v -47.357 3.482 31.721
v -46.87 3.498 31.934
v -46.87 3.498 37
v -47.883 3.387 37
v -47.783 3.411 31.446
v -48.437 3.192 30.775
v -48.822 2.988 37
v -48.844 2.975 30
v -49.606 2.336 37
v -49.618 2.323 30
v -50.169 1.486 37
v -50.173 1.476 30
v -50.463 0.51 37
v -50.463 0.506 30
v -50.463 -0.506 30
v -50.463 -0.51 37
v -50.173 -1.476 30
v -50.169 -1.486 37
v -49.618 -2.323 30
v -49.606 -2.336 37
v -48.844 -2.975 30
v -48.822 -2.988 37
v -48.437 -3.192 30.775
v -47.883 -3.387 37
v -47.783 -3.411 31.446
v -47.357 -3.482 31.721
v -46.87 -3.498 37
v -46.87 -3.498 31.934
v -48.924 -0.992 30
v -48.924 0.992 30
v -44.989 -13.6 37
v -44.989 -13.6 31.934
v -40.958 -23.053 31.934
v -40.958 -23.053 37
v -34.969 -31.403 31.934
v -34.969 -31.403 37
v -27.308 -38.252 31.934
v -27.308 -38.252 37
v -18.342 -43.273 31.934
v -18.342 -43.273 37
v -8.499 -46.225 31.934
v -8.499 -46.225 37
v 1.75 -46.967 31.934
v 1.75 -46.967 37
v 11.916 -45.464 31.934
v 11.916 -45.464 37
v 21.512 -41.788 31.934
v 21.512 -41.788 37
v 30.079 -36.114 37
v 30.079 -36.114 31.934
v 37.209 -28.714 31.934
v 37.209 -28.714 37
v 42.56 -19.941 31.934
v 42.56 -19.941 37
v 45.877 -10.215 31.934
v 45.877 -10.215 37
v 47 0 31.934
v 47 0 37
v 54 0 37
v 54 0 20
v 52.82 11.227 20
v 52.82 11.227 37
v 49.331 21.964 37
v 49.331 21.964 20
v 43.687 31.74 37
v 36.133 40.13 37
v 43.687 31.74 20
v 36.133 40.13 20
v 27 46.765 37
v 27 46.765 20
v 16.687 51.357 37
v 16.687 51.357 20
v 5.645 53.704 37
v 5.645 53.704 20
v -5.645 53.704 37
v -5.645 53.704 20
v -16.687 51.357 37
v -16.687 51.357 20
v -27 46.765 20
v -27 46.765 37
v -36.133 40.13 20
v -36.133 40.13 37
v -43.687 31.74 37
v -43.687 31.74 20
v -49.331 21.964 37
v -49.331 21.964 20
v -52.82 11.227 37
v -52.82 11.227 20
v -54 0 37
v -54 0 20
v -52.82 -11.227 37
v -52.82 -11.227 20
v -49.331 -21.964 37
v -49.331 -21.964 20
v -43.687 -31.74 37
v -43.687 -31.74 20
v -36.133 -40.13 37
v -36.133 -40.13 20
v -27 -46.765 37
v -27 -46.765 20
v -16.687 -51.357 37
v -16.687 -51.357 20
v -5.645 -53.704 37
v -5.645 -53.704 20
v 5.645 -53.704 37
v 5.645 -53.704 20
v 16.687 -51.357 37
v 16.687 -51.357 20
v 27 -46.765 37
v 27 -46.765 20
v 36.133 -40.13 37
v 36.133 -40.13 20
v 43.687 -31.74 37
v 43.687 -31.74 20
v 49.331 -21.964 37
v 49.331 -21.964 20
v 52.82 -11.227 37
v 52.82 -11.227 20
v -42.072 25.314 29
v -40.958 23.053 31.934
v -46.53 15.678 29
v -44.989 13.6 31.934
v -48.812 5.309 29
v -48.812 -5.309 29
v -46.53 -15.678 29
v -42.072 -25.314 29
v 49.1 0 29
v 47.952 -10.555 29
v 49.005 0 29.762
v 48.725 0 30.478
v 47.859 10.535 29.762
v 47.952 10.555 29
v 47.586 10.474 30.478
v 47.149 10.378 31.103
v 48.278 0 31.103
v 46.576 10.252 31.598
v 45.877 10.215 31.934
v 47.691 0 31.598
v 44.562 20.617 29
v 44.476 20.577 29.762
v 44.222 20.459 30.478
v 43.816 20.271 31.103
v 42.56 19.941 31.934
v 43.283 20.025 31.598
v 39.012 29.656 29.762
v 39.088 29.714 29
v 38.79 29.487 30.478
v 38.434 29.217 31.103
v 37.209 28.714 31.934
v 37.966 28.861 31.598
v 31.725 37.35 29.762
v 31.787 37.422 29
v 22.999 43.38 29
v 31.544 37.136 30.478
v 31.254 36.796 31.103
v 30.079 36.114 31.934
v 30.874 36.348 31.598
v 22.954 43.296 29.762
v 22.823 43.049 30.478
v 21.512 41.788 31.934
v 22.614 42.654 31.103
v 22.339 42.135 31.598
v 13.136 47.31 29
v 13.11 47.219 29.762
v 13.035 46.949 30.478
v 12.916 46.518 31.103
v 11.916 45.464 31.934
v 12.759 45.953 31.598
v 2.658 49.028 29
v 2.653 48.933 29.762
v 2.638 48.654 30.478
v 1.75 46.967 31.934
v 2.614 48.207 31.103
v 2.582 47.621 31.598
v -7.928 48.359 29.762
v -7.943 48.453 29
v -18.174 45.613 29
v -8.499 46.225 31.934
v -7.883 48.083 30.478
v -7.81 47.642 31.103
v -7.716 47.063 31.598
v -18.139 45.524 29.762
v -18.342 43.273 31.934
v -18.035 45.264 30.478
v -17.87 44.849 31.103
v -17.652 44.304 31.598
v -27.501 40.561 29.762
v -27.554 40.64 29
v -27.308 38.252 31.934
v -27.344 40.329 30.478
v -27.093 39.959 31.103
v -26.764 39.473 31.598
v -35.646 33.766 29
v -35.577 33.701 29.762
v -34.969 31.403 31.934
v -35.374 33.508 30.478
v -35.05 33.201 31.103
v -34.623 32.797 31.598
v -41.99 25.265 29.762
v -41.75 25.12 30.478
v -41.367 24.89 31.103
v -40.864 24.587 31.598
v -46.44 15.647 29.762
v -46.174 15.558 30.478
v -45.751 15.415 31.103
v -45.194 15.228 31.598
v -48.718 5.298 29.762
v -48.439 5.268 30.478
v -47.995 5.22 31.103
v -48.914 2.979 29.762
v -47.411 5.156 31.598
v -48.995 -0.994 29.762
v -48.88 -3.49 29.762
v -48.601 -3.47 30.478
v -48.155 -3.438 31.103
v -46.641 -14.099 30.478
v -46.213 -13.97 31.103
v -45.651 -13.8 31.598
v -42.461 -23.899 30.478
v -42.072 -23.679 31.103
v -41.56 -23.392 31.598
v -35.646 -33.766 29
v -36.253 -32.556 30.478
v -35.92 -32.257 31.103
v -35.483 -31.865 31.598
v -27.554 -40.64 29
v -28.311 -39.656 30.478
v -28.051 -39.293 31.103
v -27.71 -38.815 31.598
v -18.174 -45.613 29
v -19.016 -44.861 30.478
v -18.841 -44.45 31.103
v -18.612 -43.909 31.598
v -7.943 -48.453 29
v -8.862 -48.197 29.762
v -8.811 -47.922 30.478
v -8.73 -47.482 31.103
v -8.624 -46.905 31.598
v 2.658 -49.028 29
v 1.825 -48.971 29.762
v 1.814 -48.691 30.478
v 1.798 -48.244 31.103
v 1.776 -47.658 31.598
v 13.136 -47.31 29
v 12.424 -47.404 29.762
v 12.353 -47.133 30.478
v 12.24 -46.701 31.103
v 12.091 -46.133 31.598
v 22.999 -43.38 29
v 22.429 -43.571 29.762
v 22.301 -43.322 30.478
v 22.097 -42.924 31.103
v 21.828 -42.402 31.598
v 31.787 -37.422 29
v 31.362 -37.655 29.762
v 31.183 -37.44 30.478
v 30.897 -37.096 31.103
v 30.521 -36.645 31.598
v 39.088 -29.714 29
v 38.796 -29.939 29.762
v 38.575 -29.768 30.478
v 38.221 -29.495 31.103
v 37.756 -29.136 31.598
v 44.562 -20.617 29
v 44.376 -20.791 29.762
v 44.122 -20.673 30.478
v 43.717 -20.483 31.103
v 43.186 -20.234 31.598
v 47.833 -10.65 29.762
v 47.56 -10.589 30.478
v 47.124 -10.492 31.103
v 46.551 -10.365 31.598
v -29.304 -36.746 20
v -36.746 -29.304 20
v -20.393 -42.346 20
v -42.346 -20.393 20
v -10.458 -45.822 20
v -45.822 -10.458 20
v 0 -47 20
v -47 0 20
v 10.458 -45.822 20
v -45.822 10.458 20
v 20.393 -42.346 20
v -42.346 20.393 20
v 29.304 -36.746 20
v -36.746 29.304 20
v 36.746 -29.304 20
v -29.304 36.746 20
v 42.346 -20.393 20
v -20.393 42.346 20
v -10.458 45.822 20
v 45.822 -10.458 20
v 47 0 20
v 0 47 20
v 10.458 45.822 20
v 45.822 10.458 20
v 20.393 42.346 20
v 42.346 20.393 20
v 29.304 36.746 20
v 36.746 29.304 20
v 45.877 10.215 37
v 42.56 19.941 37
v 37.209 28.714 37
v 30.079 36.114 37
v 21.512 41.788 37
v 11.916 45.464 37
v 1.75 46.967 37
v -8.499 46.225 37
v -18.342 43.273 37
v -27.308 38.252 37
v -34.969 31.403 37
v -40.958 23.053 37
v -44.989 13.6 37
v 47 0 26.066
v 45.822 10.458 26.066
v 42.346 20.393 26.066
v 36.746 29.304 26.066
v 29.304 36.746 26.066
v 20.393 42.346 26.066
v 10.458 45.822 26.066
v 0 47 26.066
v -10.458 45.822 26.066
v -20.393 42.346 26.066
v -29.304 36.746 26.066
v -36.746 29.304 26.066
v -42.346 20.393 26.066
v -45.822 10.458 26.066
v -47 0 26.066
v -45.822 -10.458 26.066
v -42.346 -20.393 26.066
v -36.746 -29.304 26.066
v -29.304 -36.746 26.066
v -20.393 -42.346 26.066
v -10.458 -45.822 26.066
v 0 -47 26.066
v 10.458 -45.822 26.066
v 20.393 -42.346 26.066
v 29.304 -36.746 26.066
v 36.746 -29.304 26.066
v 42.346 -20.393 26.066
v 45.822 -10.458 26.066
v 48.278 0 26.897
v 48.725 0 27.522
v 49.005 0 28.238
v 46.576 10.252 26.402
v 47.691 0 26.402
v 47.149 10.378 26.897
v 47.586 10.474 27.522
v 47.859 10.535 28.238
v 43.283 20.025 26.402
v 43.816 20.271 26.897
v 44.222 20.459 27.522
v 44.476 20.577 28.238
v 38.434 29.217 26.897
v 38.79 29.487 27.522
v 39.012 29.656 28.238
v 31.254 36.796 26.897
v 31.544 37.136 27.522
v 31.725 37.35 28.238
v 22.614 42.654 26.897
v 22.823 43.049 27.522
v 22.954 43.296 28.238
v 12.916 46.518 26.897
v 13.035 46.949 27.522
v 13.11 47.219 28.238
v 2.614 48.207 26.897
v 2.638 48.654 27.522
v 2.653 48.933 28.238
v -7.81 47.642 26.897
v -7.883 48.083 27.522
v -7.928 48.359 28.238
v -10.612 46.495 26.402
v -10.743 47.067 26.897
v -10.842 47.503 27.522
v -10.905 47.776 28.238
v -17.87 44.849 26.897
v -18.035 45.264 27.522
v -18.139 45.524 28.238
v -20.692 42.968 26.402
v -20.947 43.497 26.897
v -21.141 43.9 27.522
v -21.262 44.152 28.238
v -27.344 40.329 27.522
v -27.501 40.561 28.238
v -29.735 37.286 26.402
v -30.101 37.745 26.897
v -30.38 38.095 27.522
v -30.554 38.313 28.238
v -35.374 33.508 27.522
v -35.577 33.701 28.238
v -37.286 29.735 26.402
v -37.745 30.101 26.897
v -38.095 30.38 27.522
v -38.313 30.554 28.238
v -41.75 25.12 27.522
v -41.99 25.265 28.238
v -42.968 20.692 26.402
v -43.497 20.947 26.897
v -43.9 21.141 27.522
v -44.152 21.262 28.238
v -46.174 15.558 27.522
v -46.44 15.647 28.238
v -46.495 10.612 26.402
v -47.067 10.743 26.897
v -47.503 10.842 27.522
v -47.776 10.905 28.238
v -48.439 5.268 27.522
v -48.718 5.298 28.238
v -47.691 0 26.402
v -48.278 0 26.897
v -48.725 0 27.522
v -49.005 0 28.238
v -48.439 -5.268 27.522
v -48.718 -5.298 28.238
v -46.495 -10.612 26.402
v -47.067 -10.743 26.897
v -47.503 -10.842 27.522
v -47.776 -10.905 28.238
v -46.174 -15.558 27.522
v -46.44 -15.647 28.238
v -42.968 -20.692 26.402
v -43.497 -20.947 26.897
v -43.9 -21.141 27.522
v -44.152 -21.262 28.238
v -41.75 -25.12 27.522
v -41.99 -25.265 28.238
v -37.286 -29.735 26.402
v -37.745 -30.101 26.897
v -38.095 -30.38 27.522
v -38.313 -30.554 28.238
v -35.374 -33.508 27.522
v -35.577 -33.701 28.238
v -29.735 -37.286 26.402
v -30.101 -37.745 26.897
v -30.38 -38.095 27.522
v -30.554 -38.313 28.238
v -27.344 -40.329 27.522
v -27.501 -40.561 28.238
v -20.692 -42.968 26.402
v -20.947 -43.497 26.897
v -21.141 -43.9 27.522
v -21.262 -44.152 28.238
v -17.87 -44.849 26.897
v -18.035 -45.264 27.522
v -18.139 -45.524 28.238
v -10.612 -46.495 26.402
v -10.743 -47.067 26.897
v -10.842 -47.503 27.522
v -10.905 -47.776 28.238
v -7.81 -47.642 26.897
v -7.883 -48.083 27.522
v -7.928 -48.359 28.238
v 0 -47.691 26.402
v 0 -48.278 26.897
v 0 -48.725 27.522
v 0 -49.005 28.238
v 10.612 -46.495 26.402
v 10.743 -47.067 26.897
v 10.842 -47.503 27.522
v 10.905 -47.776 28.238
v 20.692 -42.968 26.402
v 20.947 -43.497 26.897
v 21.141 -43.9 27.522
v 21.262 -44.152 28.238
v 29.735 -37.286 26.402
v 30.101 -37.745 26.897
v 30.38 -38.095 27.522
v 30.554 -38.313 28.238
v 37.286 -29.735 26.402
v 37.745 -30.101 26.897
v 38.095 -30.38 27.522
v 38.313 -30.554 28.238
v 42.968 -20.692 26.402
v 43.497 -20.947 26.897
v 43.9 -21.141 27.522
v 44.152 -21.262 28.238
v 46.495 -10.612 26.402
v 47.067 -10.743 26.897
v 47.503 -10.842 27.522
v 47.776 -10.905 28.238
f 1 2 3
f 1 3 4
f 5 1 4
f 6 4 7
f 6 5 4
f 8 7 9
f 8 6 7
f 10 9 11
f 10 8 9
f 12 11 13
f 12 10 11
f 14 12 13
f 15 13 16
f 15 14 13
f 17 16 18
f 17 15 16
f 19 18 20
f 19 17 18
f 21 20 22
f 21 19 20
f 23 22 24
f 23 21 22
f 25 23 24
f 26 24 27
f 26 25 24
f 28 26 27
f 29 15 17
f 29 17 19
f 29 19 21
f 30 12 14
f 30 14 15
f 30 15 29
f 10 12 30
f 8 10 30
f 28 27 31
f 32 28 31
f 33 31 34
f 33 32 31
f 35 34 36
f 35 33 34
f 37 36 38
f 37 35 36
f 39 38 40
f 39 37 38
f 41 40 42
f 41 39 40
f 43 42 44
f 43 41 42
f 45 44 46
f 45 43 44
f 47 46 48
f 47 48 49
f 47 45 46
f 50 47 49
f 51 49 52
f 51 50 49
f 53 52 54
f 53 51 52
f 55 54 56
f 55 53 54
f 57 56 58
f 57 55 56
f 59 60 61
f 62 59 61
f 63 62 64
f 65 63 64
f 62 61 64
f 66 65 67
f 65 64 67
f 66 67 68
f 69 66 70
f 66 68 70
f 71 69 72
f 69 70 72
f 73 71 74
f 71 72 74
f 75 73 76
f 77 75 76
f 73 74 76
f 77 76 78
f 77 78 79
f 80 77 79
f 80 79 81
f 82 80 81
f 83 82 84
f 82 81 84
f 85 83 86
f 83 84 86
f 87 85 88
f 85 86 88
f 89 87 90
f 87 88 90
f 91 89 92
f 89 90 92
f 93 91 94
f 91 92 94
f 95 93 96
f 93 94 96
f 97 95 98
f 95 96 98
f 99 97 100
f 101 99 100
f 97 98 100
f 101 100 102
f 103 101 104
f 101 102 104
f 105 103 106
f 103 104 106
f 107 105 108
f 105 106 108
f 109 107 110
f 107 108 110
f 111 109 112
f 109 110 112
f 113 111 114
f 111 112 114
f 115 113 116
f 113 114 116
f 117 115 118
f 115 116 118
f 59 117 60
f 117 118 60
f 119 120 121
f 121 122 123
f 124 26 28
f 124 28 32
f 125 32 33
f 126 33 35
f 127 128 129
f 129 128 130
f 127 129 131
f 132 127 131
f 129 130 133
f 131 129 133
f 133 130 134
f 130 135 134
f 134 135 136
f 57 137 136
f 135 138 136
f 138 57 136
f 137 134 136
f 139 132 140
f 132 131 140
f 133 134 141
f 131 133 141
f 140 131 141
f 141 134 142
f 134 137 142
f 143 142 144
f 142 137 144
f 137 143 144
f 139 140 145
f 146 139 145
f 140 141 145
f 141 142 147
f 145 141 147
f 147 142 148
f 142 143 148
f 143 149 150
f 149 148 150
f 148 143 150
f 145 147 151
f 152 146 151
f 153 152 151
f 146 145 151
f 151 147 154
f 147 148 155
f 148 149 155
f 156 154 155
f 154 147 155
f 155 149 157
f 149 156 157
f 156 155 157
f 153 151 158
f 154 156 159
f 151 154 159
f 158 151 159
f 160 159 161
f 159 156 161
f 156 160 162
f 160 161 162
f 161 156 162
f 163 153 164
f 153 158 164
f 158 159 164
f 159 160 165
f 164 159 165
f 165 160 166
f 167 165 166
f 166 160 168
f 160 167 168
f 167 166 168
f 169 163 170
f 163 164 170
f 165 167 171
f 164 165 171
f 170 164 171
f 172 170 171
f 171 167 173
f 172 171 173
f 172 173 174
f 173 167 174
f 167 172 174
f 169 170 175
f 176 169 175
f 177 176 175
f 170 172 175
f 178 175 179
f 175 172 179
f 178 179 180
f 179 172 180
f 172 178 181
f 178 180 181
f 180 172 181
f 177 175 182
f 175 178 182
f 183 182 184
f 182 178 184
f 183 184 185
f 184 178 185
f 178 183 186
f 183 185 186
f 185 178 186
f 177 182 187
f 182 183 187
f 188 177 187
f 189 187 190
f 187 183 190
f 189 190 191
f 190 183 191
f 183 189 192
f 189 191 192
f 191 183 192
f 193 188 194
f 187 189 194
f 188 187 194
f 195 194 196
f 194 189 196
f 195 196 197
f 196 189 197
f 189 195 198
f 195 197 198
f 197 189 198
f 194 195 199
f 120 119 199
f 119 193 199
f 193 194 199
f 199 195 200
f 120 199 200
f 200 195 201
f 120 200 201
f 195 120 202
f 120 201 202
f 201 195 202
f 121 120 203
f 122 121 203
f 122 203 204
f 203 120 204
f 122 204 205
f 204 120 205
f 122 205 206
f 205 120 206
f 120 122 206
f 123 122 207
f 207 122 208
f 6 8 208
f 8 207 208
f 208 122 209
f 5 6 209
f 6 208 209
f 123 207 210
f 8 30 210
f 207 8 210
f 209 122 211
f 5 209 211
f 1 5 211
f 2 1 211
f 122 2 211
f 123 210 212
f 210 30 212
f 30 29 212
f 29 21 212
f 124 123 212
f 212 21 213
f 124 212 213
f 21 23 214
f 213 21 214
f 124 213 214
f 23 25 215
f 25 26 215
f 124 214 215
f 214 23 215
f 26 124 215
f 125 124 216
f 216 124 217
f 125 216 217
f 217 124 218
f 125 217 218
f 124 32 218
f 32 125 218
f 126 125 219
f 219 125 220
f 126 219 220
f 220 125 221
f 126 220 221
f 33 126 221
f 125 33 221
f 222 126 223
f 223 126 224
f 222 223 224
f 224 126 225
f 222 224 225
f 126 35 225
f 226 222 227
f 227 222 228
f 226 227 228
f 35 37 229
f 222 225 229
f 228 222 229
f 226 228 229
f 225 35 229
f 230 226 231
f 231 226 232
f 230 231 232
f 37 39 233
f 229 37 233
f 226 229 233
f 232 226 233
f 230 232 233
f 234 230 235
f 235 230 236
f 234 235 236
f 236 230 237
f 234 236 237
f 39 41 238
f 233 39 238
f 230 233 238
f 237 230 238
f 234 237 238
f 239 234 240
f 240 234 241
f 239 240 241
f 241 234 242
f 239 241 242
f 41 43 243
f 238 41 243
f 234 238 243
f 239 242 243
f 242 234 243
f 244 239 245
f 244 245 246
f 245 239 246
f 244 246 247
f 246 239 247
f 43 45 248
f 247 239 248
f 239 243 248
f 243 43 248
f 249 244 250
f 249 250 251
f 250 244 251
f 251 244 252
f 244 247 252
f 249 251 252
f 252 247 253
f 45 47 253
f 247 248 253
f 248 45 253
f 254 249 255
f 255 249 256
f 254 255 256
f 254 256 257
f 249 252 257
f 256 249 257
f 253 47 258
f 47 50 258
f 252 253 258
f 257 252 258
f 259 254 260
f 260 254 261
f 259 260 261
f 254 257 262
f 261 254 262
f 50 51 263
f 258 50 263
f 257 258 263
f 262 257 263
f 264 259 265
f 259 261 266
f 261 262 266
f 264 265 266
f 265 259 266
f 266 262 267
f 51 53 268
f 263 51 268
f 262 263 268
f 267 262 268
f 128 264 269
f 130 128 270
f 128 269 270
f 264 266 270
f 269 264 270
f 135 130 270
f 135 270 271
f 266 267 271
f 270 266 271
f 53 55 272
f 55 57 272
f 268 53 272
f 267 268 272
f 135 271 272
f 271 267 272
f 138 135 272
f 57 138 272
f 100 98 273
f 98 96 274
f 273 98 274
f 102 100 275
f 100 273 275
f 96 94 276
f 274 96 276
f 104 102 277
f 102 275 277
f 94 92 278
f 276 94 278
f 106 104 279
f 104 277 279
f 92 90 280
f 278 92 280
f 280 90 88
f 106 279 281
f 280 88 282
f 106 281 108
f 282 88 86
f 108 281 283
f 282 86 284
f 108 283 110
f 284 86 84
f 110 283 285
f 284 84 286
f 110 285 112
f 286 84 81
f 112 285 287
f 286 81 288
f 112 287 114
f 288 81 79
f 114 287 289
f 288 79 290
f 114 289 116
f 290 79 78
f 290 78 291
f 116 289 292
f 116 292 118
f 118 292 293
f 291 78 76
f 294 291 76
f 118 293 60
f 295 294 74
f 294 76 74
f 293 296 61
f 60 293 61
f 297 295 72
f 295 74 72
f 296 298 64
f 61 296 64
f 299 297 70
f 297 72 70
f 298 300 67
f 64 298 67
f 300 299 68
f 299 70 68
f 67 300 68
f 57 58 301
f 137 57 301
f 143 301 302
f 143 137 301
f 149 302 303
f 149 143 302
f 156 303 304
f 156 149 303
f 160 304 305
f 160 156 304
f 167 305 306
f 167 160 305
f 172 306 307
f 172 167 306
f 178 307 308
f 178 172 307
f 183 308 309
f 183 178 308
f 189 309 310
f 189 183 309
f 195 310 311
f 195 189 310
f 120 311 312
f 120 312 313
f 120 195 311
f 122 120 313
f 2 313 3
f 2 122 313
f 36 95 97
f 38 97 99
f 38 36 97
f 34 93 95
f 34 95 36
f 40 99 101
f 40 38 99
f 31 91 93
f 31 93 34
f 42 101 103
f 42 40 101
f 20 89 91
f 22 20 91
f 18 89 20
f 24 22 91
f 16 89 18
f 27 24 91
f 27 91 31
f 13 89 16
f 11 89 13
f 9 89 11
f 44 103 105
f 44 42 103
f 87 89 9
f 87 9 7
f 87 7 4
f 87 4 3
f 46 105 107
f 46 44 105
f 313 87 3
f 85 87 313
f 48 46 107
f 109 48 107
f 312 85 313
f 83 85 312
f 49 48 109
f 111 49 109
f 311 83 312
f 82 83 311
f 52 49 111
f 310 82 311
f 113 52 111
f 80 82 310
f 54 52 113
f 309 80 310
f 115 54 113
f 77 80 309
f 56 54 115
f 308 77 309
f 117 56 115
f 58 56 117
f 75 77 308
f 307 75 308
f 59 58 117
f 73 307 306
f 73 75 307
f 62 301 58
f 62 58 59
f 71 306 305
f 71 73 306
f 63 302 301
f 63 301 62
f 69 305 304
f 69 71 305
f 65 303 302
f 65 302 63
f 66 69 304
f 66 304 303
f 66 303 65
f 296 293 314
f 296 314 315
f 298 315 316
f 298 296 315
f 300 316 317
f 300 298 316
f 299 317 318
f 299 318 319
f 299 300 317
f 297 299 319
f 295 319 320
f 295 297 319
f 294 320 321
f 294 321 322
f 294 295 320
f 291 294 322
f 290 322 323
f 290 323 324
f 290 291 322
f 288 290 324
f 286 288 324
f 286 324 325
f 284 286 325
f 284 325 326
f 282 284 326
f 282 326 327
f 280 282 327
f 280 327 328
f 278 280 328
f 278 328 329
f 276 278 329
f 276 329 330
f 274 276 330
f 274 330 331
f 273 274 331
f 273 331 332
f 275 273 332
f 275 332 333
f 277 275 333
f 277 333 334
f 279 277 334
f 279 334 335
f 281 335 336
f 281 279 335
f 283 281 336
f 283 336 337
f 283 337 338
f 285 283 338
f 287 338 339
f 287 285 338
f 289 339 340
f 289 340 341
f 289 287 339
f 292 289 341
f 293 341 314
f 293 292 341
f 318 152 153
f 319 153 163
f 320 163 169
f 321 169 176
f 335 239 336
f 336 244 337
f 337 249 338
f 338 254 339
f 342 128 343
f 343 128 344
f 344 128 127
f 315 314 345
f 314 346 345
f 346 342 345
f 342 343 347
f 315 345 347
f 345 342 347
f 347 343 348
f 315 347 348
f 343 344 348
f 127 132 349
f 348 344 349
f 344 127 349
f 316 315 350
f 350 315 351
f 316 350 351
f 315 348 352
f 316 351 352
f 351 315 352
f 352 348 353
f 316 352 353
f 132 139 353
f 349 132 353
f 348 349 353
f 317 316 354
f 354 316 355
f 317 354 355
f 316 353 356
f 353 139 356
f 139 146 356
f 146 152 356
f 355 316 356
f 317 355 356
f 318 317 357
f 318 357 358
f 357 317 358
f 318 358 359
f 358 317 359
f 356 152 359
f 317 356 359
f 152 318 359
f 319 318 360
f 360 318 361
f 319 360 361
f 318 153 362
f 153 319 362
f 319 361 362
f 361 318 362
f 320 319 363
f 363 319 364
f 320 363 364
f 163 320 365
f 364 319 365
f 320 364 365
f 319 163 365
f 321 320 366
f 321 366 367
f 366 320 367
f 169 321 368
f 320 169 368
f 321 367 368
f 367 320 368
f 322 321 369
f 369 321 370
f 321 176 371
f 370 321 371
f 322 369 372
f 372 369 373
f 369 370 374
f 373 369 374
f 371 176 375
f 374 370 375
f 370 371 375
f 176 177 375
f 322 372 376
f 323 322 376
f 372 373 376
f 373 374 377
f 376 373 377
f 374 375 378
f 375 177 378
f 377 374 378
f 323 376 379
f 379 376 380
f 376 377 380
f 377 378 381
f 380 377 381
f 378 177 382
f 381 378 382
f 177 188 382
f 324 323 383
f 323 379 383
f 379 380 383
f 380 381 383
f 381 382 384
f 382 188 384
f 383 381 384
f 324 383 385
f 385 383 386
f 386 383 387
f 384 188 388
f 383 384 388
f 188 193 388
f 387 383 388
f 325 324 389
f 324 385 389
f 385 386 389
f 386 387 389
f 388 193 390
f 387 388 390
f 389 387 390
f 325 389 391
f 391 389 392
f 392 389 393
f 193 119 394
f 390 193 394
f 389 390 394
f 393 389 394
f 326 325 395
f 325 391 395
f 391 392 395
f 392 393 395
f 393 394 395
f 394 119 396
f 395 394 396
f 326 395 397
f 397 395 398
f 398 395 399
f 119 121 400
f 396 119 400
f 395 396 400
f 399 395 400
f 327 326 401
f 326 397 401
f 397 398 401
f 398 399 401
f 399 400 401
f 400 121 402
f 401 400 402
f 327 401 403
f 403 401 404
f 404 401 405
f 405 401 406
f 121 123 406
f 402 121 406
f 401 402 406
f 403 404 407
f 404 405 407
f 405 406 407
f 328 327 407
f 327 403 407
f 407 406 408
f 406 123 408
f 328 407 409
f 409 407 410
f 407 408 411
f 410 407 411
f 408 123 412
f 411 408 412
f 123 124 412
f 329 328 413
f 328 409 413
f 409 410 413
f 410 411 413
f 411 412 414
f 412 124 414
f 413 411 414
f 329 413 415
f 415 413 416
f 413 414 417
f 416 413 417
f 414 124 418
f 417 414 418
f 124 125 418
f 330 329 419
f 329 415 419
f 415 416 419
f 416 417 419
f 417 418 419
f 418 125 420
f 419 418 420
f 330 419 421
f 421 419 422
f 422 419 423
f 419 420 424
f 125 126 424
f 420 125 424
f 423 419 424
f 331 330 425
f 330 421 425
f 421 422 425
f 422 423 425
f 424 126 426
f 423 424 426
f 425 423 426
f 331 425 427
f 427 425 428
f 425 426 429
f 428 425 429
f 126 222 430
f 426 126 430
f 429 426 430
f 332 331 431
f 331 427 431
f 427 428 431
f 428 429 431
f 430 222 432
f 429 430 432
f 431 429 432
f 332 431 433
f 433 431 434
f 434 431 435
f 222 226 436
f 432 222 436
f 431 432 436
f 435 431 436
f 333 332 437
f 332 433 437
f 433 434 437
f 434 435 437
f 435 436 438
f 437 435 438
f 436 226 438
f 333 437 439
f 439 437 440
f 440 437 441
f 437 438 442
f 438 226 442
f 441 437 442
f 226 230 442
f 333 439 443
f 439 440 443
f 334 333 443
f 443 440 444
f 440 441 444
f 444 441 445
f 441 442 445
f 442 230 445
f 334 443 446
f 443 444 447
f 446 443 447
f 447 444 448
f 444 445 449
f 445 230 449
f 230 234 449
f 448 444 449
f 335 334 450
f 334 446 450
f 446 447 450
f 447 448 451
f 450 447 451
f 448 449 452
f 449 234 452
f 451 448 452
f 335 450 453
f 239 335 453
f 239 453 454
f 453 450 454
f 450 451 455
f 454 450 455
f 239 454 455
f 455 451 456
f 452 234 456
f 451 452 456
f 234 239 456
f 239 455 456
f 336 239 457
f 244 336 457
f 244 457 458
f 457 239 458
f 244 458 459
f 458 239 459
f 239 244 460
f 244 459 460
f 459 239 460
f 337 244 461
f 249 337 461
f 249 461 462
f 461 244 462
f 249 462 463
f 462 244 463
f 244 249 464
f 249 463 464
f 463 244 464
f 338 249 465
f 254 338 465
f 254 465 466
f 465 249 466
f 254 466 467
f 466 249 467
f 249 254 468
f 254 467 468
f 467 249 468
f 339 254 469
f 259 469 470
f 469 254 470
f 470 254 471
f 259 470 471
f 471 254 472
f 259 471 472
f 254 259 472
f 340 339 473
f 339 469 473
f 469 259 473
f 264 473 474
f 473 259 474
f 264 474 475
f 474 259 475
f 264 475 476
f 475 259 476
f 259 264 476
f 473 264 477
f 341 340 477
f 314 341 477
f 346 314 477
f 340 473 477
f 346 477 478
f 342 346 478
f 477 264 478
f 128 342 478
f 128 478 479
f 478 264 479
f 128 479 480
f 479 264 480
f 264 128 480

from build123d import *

# Parameters (mm, degrees)
CYLINDER016_R               = 1.5
CYLINDER016_DEPTH           = 23
BOX007_W                    = 8
BOX007_H                    = 5.6
BOX007_DEPTH                = 2
COMPOUND024_PLACEMENT_ANGLE = 45
COMPOUND025_PLACEMENT_ANGLE = 90
COMPOUND026_PLACEMENT_ANGLE = 135
COMPOUND027_PLACEMENT_ANGLE = 180
COMPOUND028_PLACEMENT_ANGLE = 225
COMPOUND029_PLACEMENT_ANGLE = 90
COMPOUND030_PLACEMENT_ANGLE = 45
CYLINDER006_R               = 3.5
CYLINDER006_DEPTH           = 10
TORUS001_R                  = 3.1
TUBE002_R                   = 54
TUBE002_R_2                 = 47
TUBE002_DEPTH               = 17


with BuildPart() as v_lec016:
    # Cylinder016 → Cylinder016 (new body)
    with BuildSketch(Plane(origin=(59, 0, -1), x_dir=(1, 0, 0), z_dir=(0, 0, 1))):
        Circle(CYLINDER016_R)
    extrude(amount=CYLINDER016_DEPTH)


with BuildPart() as krychle007:
    # Box007 → Box007 (new body)
    with BuildSketch(Plane(origin=(55, -2.8, 22), x_dir=(1, 0, 0), z_dir=(0, 0, 1))):
        with Locations((4, 2.8)):
            Rectangle(BOX007_W, BOX007_H)
    extrude(amount=BOX007_DEPTH)


with BuildPart() as compound024:
    # Compound024 base: copy of Krychle007
    add(krychle007.part)

    # Compound024: union Válec016
    add(v_lec016.part)


with BuildPart() as compound024_1:
    # Compound024 placement: moved
    add(compound024.part.moved(Location((-6.363961, -6.363961, 0))).rotate(Axis((-6.363961, -6.363961, 0), (0, 0, 1)), COMPOUND024_PLACEMENT_ANGLE))


with BuildPart() as compound025:
    # Compound025 base: copy of Krychle007
    add(krychle007.part)

    # Compound025: union Válec016
    add(v_lec016.part)


with BuildPart() as compound025_1:
    # Compound025 placement: moved
    add(compound025.part.moved(Location((0, -9, 0))).rotate(Axis((0, -9, 0), (0, 0, 1)), COMPOUND025_PLACEMENT_ANGLE))


with BuildPart() as compound026:
    # Compound026 base: copy of Krychle007
    add(krychle007.part)

    # Compound026: union Válec016
    add(v_lec016.part)


with BuildPart() as compound026_1:
    # Compound026 placement: moved
    add(compound026.part.moved(Location((6.363961, -6.363961, 0))).rotate(Axis((6.363961, -6.363961, 0), (0, 0, 1)), COMPOUND026_PLACEMENT_ANGLE))


with BuildPart() as compound027:
    # Compound027 base: copy of Krychle007
    add(krychle007.part)

    # Compound027: union Válec016
    add(v_lec016.part)


with BuildPart() as compound027_1:
    # Compound027 placement: moved
    add(compound027.part.moved(Location((9, 0, 0))).rotate(Axis((9, 0, 0), (0, 0, 1)), COMPOUND027_PLACEMENT_ANGLE))


with BuildPart() as compound028:
    # Compound028 base: copy of Krychle007
    add(krychle007.part)

    # Compound028: union Válec016
    add(v_lec016.part)


with BuildPart() as compound028_1:
    # Compound028 placement: moved
    add(compound028.part.moved(Location((6.363961, 6.363961, 0))).rotate(Axis((6.363961, 6.363961, 0), (0, 0, 1)), COMPOUND028_PLACEMENT_ANGLE))


with BuildPart() as compound029:
    # Compound029 base: copy of Krychle007
    add(krychle007.part)

    # Compound029: union Válec016
    add(v_lec016.part)


with BuildPart() as compound029_1:
    # Compound029 placement: moved
    add(compound029.part.moved(Location((0, 9, 0))).rotate(Axis((0, 9, 0), (0, 0, -1)), COMPOUND029_PLACEMENT_ANGLE))


with BuildPart() as compound030:
    # Compound030 base: copy of Krychle007
    add(krychle007.part)

    # Compound030: union Válec016
    add(v_lec016.part)


with BuildPart() as compound030_1:
    # Compound030 placement: moved
    add(compound030.part.moved(Location((-6.363961, 6.363961, 0))).rotate(Axis((-6.363961, 6.363961, 0), (0, 0, -1)), COMPOUND030_PLACEMENT_ANGLE))


with BuildPart() as compound031:
    # Compound023 base: copy of Krychle007
    add(krychle007.part)

    # Compound023: union Válec016
    add(v_lec016.part)


with BuildPart() as compound031_1:
    # Compound023 placement: moved
    add(compound031.part.moved(Location((-9, 0, 0))))

    # Compound031: union Compound024, Compound025, Compound026, Compound027, Compound028, Compound029, Compound030
    add(compound024_1.part)
    add(compound025_1.part)
    add(compound026_1.part)
    add(compound027_1.part)
    add(compound028_1.part)
    add(compound029_1.part)
    add(compound030_1.part)


with BuildPart() as compound031_2:
    # Compound031 placement: moved
    add(compound031_1.part.moved(Location((0, 200, 0))))


with BuildPart() as v_lec006:
    # Cylinder006 → Cylinder006 (new body)
    with BuildSketch(Plane(origin=(-47, 0, 30), x_dir=(1, 0, 0), z_dir=(0, 0, 1))):
        Circle(CYLINDER006_R)
    extrude(amount=CYLINDER006_DEPTH)


with BuildPart() as anuloid001:
    # Torus001 → Torus001 (revolve)
    with BuildSketch(Plane(origin=(0, 0, 29), x_dir=(1, 0, 0), z_dir=(0, -1, 0))):
        with Locations((46, 0)):
            Circle(TORUS001_R)
    revolve(axis=Axis((0, 0, 29), (0, 0, 1)))


with BuildPart() as cut015:
    # Tube002 → Tube002 (new body)
    with BuildSketch(Plane.XY.offset(20)):
        Circle(TUBE002_R)
        Circle(TUBE002_R_2, mode=Mode.SUBTRACT)
    extrude(amount=TUBE002_DEPTH)

    # Cut009: cut Anuloid001
    add(anuloid001.part, mode=Mode.SUBTRACT)

    # Cut010: cut Válec006
    add(v_lec006.part, mode=Mode.SUBTRACT)

    # Cut015: cut Compound031
    add(compound031_2.part, mode=Mode.SUBTRACT)


solid = cut015.part
